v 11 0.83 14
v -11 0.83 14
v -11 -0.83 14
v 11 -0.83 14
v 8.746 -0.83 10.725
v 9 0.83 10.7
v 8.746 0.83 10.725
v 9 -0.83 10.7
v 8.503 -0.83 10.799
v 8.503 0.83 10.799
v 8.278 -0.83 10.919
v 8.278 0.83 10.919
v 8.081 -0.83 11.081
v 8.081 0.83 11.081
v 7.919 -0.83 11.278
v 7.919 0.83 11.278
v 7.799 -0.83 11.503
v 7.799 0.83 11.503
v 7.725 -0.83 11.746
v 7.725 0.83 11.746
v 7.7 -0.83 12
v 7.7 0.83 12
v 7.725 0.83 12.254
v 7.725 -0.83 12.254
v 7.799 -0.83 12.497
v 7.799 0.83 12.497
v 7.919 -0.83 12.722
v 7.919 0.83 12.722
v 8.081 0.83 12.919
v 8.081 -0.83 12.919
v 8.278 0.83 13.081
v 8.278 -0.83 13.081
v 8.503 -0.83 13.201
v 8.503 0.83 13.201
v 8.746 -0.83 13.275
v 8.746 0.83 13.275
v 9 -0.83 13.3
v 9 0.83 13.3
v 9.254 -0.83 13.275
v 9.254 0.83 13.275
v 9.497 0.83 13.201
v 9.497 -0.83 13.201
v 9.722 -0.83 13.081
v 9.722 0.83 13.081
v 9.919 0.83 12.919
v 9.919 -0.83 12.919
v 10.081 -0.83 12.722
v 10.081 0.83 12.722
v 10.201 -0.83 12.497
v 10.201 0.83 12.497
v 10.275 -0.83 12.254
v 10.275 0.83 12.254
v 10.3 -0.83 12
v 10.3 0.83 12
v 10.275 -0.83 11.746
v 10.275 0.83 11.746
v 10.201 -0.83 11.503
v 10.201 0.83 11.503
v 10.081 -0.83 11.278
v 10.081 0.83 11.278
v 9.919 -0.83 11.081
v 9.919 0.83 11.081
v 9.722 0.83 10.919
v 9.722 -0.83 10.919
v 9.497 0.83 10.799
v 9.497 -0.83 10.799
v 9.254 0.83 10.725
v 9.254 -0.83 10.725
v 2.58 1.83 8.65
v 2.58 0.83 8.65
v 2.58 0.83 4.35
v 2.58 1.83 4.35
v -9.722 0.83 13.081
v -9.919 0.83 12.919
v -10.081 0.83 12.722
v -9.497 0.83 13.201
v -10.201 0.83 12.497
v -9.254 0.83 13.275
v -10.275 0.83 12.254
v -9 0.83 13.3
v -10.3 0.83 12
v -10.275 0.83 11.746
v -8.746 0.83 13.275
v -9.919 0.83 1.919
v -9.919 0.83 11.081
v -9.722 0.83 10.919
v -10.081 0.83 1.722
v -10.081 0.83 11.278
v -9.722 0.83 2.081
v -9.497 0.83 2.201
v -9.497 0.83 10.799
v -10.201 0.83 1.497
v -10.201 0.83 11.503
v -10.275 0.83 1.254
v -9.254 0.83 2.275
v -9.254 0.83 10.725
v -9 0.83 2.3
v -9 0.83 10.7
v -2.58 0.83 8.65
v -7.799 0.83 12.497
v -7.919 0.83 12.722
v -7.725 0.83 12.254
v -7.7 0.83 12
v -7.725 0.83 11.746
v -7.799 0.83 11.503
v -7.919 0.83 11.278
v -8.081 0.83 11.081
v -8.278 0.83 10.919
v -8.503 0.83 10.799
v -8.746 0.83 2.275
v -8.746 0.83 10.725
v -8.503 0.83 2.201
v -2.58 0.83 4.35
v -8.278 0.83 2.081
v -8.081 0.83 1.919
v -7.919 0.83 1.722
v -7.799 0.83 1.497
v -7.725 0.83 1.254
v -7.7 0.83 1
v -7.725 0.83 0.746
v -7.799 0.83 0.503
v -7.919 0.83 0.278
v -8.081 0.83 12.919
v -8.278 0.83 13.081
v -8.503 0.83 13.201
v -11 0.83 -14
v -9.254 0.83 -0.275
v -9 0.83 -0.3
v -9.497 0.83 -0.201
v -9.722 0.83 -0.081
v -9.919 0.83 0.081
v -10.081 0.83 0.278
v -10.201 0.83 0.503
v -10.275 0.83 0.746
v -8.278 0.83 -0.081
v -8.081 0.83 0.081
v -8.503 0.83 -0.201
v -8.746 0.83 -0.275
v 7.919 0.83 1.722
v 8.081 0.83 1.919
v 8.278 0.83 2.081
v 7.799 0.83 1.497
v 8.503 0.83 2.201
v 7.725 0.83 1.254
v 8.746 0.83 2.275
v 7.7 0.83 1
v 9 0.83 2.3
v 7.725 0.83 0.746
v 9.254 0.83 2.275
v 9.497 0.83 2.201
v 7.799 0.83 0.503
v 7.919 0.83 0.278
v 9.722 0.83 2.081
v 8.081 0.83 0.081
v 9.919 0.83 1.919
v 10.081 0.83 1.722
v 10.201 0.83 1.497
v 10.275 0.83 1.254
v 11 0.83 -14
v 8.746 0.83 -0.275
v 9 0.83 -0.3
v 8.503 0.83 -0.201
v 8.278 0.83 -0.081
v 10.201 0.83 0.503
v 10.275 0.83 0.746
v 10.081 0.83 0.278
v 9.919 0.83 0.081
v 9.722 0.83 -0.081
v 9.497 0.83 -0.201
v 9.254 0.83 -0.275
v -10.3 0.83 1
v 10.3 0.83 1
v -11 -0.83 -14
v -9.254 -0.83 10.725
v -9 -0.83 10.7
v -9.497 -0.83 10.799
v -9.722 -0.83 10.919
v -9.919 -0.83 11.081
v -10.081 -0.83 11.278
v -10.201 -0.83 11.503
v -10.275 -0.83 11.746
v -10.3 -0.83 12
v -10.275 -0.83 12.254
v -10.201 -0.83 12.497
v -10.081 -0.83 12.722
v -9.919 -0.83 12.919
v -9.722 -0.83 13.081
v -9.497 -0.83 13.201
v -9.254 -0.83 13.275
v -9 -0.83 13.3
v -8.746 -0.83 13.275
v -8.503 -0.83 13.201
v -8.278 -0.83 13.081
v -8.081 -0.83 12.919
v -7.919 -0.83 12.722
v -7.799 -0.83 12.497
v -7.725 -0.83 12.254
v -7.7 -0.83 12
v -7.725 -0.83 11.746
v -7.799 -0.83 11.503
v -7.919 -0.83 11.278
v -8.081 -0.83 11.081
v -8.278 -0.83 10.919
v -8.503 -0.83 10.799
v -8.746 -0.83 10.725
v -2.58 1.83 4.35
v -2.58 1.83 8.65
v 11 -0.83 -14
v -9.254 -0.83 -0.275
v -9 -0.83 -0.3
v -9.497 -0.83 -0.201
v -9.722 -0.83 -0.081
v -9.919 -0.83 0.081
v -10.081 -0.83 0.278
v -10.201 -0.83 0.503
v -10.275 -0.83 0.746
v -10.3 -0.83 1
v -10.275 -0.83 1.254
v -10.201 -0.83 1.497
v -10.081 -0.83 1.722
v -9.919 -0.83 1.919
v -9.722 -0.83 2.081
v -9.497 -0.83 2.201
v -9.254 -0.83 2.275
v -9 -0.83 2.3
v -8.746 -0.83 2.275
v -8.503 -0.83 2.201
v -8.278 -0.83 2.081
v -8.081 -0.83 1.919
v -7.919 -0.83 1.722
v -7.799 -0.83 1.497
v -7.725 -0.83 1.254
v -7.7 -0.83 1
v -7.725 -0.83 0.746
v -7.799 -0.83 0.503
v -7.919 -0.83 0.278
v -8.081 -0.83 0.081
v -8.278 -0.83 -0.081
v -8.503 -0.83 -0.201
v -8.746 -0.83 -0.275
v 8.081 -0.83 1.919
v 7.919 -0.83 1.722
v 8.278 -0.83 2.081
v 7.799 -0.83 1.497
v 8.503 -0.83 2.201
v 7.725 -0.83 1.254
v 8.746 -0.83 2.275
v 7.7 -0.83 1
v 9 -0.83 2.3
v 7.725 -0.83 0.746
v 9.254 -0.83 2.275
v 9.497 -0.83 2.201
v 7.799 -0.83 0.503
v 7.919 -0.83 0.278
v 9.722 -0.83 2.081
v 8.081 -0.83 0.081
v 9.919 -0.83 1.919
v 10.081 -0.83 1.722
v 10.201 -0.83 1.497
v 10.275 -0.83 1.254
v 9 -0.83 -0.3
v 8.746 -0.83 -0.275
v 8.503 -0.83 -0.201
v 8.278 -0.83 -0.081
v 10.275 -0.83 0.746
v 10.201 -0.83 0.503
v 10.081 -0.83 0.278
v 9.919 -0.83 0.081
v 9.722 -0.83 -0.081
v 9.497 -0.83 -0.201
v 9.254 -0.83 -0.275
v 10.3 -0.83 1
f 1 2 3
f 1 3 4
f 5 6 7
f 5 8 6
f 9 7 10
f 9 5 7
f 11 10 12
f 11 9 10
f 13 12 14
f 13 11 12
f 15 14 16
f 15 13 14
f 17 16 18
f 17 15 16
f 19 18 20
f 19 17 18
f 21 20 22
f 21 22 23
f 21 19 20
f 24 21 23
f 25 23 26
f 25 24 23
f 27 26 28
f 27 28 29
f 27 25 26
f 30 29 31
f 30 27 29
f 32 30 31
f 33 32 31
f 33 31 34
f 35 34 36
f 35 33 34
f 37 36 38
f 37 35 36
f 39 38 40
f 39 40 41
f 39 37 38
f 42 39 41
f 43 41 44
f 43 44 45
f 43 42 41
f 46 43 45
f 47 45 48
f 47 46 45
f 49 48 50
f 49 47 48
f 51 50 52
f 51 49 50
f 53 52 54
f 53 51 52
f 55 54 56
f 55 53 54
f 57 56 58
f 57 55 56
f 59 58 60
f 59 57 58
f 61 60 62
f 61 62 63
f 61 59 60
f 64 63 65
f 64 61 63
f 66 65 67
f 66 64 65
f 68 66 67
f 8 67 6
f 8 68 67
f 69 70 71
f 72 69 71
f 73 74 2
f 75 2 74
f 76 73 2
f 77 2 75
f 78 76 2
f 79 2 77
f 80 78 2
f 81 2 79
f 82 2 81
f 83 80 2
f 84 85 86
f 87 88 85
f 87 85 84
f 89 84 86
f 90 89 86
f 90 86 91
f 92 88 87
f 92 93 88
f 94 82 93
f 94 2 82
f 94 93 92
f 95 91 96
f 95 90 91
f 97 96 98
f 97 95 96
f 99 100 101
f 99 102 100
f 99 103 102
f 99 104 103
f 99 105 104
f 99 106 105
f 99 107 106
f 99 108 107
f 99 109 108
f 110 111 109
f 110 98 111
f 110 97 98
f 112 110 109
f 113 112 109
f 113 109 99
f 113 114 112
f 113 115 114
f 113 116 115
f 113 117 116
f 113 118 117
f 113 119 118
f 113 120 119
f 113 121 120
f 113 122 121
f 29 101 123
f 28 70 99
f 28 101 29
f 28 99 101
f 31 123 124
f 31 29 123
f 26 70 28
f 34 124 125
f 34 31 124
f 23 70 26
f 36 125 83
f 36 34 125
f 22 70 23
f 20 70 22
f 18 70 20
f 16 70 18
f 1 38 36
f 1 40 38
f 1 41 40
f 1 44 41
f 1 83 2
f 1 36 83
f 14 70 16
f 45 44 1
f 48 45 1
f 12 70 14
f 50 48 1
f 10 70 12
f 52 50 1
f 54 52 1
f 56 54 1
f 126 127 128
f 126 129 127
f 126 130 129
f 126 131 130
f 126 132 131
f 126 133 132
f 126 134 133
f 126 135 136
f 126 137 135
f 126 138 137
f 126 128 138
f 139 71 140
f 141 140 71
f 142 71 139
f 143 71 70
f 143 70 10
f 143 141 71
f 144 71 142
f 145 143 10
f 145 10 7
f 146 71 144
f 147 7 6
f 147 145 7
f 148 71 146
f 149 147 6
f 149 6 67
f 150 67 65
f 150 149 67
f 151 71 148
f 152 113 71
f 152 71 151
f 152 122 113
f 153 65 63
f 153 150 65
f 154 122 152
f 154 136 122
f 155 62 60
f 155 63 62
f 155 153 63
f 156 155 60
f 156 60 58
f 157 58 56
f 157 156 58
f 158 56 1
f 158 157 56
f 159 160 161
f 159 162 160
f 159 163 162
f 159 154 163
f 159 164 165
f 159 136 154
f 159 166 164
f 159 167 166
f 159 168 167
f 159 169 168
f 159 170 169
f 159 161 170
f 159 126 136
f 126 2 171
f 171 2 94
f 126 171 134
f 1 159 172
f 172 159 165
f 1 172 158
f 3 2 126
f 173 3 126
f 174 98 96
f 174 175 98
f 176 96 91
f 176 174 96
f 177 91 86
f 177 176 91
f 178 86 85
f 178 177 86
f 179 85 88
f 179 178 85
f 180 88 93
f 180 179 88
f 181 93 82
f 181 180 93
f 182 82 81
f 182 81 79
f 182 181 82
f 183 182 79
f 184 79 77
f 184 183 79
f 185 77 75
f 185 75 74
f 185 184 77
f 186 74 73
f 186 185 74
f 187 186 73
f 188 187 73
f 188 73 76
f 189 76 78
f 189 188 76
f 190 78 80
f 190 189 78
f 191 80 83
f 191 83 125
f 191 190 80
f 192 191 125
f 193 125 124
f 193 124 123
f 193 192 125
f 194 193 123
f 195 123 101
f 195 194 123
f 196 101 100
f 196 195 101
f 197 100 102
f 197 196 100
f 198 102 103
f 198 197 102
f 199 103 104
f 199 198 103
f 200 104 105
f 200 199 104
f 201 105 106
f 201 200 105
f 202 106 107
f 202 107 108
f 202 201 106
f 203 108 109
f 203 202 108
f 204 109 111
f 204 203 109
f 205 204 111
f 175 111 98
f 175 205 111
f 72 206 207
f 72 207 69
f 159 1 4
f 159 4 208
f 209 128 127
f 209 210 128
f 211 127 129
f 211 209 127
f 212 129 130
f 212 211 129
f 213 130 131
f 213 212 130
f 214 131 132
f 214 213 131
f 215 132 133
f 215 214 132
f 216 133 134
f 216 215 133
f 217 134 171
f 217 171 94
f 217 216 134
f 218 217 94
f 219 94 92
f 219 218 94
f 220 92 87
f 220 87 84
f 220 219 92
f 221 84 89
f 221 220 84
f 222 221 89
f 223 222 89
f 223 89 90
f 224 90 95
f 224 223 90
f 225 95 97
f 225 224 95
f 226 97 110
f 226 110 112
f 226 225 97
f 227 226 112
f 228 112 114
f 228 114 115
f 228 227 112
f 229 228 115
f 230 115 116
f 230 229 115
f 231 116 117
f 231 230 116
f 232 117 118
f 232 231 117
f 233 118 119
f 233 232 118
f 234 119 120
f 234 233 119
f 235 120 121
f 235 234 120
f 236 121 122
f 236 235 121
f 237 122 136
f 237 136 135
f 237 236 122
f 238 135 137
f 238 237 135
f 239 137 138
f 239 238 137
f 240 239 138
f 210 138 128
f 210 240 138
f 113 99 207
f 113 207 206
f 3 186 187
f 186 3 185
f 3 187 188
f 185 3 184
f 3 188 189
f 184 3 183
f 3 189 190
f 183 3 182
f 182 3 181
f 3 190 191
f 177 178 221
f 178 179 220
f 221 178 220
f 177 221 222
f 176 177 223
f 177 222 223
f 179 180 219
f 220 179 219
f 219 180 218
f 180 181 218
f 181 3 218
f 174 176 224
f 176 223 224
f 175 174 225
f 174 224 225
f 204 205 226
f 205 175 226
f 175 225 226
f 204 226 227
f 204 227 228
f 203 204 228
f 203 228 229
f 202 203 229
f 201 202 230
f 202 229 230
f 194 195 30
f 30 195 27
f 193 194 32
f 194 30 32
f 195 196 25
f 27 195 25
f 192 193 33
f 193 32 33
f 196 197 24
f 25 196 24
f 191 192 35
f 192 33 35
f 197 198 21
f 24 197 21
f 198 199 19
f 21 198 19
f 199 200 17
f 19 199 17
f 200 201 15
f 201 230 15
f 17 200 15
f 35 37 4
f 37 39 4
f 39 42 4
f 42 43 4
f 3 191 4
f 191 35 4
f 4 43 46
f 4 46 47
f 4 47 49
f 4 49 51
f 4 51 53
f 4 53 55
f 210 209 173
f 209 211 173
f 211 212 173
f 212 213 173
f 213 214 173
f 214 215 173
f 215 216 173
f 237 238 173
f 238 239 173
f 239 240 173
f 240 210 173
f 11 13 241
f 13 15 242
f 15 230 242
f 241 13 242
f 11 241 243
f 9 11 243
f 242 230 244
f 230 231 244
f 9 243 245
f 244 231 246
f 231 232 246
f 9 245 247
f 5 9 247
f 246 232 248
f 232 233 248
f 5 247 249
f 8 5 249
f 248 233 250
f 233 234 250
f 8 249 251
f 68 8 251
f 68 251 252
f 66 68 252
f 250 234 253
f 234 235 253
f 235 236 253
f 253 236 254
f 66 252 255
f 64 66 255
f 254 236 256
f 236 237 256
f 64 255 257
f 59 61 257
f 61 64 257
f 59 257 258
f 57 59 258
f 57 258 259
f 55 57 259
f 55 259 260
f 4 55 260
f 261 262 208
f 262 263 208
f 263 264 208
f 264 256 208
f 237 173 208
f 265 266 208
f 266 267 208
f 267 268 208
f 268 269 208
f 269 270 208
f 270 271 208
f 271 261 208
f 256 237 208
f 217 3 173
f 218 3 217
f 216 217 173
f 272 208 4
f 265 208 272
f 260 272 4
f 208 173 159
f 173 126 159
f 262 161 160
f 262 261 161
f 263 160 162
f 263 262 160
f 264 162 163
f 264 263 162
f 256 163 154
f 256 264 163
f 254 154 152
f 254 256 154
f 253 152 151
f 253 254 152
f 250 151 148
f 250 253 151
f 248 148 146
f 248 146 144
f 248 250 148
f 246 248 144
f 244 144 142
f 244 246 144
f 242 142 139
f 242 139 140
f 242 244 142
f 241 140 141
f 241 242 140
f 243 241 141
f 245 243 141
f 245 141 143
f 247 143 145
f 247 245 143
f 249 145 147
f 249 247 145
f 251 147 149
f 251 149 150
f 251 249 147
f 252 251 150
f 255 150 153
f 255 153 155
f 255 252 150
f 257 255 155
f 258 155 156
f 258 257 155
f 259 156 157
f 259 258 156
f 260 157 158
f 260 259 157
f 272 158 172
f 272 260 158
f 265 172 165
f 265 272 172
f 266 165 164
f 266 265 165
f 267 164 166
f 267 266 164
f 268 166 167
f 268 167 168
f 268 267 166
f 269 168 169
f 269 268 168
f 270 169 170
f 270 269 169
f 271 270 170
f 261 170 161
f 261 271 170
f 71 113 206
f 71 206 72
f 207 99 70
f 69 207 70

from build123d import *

# Parameters (mm, degrees)
SKETCH1_W           = 22
SKETCH1_H           = 28
SKETCH1_R           = 1.3
BOSS_EXTRUDE1_DEPTH = 0.83
SKETCH2_W           = 5.16
SKETCH2_H           = 4.3
BOSS_EXTRUDE2_DEPTH = 1


with BuildPart() as part:
    # Sketch1 → Boss-Extrude1 (new, symmetric)
    with BuildSketch(Plane(origin=(0, 0, 0), x_dir=(1, 0, 0), z_dir=(0, 1, 0))):
        Rectangle(SKETCH1_W, SKETCH1_H)
        with Locations(Location((-9, -1, 0), (0, 0, 90))):
            Circle(SKETCH1_R, mode=Mode.SUBTRACT)
        with Locations(Location((9, -1, 0), (0, 0, 90))):
            Circle(SKETCH1_R, mode=Mode.SUBTRACT)
        with Locations(Location((-9, -12, 0), (0, 0, 90))):
            Circle(SKETCH1_R, mode=Mode.SUBTRACT)
        with Locations(Location((9, -12, 0), (0, 0, 90))):
            Circle(SKETCH1_R, mode=Mode.SUBTRACT)
    extrude(amount=BOSS_EXTRUDE1_DEPTH, both=True)

    # Sketch2 → Boss-Extrude2 (add)
    with BuildSketch(Plane(origin=(0, 0.83, 0), x_dir=(1, 0, 0), z_dir=(0, 1, 0))):
        with Locations((0, -6.5)):
            Rectangle(SKETCH2_W, SKETCH2_H)
    extrude(amount=BOSS_EXTRUDE2_DEPTH)


solid = part.part
